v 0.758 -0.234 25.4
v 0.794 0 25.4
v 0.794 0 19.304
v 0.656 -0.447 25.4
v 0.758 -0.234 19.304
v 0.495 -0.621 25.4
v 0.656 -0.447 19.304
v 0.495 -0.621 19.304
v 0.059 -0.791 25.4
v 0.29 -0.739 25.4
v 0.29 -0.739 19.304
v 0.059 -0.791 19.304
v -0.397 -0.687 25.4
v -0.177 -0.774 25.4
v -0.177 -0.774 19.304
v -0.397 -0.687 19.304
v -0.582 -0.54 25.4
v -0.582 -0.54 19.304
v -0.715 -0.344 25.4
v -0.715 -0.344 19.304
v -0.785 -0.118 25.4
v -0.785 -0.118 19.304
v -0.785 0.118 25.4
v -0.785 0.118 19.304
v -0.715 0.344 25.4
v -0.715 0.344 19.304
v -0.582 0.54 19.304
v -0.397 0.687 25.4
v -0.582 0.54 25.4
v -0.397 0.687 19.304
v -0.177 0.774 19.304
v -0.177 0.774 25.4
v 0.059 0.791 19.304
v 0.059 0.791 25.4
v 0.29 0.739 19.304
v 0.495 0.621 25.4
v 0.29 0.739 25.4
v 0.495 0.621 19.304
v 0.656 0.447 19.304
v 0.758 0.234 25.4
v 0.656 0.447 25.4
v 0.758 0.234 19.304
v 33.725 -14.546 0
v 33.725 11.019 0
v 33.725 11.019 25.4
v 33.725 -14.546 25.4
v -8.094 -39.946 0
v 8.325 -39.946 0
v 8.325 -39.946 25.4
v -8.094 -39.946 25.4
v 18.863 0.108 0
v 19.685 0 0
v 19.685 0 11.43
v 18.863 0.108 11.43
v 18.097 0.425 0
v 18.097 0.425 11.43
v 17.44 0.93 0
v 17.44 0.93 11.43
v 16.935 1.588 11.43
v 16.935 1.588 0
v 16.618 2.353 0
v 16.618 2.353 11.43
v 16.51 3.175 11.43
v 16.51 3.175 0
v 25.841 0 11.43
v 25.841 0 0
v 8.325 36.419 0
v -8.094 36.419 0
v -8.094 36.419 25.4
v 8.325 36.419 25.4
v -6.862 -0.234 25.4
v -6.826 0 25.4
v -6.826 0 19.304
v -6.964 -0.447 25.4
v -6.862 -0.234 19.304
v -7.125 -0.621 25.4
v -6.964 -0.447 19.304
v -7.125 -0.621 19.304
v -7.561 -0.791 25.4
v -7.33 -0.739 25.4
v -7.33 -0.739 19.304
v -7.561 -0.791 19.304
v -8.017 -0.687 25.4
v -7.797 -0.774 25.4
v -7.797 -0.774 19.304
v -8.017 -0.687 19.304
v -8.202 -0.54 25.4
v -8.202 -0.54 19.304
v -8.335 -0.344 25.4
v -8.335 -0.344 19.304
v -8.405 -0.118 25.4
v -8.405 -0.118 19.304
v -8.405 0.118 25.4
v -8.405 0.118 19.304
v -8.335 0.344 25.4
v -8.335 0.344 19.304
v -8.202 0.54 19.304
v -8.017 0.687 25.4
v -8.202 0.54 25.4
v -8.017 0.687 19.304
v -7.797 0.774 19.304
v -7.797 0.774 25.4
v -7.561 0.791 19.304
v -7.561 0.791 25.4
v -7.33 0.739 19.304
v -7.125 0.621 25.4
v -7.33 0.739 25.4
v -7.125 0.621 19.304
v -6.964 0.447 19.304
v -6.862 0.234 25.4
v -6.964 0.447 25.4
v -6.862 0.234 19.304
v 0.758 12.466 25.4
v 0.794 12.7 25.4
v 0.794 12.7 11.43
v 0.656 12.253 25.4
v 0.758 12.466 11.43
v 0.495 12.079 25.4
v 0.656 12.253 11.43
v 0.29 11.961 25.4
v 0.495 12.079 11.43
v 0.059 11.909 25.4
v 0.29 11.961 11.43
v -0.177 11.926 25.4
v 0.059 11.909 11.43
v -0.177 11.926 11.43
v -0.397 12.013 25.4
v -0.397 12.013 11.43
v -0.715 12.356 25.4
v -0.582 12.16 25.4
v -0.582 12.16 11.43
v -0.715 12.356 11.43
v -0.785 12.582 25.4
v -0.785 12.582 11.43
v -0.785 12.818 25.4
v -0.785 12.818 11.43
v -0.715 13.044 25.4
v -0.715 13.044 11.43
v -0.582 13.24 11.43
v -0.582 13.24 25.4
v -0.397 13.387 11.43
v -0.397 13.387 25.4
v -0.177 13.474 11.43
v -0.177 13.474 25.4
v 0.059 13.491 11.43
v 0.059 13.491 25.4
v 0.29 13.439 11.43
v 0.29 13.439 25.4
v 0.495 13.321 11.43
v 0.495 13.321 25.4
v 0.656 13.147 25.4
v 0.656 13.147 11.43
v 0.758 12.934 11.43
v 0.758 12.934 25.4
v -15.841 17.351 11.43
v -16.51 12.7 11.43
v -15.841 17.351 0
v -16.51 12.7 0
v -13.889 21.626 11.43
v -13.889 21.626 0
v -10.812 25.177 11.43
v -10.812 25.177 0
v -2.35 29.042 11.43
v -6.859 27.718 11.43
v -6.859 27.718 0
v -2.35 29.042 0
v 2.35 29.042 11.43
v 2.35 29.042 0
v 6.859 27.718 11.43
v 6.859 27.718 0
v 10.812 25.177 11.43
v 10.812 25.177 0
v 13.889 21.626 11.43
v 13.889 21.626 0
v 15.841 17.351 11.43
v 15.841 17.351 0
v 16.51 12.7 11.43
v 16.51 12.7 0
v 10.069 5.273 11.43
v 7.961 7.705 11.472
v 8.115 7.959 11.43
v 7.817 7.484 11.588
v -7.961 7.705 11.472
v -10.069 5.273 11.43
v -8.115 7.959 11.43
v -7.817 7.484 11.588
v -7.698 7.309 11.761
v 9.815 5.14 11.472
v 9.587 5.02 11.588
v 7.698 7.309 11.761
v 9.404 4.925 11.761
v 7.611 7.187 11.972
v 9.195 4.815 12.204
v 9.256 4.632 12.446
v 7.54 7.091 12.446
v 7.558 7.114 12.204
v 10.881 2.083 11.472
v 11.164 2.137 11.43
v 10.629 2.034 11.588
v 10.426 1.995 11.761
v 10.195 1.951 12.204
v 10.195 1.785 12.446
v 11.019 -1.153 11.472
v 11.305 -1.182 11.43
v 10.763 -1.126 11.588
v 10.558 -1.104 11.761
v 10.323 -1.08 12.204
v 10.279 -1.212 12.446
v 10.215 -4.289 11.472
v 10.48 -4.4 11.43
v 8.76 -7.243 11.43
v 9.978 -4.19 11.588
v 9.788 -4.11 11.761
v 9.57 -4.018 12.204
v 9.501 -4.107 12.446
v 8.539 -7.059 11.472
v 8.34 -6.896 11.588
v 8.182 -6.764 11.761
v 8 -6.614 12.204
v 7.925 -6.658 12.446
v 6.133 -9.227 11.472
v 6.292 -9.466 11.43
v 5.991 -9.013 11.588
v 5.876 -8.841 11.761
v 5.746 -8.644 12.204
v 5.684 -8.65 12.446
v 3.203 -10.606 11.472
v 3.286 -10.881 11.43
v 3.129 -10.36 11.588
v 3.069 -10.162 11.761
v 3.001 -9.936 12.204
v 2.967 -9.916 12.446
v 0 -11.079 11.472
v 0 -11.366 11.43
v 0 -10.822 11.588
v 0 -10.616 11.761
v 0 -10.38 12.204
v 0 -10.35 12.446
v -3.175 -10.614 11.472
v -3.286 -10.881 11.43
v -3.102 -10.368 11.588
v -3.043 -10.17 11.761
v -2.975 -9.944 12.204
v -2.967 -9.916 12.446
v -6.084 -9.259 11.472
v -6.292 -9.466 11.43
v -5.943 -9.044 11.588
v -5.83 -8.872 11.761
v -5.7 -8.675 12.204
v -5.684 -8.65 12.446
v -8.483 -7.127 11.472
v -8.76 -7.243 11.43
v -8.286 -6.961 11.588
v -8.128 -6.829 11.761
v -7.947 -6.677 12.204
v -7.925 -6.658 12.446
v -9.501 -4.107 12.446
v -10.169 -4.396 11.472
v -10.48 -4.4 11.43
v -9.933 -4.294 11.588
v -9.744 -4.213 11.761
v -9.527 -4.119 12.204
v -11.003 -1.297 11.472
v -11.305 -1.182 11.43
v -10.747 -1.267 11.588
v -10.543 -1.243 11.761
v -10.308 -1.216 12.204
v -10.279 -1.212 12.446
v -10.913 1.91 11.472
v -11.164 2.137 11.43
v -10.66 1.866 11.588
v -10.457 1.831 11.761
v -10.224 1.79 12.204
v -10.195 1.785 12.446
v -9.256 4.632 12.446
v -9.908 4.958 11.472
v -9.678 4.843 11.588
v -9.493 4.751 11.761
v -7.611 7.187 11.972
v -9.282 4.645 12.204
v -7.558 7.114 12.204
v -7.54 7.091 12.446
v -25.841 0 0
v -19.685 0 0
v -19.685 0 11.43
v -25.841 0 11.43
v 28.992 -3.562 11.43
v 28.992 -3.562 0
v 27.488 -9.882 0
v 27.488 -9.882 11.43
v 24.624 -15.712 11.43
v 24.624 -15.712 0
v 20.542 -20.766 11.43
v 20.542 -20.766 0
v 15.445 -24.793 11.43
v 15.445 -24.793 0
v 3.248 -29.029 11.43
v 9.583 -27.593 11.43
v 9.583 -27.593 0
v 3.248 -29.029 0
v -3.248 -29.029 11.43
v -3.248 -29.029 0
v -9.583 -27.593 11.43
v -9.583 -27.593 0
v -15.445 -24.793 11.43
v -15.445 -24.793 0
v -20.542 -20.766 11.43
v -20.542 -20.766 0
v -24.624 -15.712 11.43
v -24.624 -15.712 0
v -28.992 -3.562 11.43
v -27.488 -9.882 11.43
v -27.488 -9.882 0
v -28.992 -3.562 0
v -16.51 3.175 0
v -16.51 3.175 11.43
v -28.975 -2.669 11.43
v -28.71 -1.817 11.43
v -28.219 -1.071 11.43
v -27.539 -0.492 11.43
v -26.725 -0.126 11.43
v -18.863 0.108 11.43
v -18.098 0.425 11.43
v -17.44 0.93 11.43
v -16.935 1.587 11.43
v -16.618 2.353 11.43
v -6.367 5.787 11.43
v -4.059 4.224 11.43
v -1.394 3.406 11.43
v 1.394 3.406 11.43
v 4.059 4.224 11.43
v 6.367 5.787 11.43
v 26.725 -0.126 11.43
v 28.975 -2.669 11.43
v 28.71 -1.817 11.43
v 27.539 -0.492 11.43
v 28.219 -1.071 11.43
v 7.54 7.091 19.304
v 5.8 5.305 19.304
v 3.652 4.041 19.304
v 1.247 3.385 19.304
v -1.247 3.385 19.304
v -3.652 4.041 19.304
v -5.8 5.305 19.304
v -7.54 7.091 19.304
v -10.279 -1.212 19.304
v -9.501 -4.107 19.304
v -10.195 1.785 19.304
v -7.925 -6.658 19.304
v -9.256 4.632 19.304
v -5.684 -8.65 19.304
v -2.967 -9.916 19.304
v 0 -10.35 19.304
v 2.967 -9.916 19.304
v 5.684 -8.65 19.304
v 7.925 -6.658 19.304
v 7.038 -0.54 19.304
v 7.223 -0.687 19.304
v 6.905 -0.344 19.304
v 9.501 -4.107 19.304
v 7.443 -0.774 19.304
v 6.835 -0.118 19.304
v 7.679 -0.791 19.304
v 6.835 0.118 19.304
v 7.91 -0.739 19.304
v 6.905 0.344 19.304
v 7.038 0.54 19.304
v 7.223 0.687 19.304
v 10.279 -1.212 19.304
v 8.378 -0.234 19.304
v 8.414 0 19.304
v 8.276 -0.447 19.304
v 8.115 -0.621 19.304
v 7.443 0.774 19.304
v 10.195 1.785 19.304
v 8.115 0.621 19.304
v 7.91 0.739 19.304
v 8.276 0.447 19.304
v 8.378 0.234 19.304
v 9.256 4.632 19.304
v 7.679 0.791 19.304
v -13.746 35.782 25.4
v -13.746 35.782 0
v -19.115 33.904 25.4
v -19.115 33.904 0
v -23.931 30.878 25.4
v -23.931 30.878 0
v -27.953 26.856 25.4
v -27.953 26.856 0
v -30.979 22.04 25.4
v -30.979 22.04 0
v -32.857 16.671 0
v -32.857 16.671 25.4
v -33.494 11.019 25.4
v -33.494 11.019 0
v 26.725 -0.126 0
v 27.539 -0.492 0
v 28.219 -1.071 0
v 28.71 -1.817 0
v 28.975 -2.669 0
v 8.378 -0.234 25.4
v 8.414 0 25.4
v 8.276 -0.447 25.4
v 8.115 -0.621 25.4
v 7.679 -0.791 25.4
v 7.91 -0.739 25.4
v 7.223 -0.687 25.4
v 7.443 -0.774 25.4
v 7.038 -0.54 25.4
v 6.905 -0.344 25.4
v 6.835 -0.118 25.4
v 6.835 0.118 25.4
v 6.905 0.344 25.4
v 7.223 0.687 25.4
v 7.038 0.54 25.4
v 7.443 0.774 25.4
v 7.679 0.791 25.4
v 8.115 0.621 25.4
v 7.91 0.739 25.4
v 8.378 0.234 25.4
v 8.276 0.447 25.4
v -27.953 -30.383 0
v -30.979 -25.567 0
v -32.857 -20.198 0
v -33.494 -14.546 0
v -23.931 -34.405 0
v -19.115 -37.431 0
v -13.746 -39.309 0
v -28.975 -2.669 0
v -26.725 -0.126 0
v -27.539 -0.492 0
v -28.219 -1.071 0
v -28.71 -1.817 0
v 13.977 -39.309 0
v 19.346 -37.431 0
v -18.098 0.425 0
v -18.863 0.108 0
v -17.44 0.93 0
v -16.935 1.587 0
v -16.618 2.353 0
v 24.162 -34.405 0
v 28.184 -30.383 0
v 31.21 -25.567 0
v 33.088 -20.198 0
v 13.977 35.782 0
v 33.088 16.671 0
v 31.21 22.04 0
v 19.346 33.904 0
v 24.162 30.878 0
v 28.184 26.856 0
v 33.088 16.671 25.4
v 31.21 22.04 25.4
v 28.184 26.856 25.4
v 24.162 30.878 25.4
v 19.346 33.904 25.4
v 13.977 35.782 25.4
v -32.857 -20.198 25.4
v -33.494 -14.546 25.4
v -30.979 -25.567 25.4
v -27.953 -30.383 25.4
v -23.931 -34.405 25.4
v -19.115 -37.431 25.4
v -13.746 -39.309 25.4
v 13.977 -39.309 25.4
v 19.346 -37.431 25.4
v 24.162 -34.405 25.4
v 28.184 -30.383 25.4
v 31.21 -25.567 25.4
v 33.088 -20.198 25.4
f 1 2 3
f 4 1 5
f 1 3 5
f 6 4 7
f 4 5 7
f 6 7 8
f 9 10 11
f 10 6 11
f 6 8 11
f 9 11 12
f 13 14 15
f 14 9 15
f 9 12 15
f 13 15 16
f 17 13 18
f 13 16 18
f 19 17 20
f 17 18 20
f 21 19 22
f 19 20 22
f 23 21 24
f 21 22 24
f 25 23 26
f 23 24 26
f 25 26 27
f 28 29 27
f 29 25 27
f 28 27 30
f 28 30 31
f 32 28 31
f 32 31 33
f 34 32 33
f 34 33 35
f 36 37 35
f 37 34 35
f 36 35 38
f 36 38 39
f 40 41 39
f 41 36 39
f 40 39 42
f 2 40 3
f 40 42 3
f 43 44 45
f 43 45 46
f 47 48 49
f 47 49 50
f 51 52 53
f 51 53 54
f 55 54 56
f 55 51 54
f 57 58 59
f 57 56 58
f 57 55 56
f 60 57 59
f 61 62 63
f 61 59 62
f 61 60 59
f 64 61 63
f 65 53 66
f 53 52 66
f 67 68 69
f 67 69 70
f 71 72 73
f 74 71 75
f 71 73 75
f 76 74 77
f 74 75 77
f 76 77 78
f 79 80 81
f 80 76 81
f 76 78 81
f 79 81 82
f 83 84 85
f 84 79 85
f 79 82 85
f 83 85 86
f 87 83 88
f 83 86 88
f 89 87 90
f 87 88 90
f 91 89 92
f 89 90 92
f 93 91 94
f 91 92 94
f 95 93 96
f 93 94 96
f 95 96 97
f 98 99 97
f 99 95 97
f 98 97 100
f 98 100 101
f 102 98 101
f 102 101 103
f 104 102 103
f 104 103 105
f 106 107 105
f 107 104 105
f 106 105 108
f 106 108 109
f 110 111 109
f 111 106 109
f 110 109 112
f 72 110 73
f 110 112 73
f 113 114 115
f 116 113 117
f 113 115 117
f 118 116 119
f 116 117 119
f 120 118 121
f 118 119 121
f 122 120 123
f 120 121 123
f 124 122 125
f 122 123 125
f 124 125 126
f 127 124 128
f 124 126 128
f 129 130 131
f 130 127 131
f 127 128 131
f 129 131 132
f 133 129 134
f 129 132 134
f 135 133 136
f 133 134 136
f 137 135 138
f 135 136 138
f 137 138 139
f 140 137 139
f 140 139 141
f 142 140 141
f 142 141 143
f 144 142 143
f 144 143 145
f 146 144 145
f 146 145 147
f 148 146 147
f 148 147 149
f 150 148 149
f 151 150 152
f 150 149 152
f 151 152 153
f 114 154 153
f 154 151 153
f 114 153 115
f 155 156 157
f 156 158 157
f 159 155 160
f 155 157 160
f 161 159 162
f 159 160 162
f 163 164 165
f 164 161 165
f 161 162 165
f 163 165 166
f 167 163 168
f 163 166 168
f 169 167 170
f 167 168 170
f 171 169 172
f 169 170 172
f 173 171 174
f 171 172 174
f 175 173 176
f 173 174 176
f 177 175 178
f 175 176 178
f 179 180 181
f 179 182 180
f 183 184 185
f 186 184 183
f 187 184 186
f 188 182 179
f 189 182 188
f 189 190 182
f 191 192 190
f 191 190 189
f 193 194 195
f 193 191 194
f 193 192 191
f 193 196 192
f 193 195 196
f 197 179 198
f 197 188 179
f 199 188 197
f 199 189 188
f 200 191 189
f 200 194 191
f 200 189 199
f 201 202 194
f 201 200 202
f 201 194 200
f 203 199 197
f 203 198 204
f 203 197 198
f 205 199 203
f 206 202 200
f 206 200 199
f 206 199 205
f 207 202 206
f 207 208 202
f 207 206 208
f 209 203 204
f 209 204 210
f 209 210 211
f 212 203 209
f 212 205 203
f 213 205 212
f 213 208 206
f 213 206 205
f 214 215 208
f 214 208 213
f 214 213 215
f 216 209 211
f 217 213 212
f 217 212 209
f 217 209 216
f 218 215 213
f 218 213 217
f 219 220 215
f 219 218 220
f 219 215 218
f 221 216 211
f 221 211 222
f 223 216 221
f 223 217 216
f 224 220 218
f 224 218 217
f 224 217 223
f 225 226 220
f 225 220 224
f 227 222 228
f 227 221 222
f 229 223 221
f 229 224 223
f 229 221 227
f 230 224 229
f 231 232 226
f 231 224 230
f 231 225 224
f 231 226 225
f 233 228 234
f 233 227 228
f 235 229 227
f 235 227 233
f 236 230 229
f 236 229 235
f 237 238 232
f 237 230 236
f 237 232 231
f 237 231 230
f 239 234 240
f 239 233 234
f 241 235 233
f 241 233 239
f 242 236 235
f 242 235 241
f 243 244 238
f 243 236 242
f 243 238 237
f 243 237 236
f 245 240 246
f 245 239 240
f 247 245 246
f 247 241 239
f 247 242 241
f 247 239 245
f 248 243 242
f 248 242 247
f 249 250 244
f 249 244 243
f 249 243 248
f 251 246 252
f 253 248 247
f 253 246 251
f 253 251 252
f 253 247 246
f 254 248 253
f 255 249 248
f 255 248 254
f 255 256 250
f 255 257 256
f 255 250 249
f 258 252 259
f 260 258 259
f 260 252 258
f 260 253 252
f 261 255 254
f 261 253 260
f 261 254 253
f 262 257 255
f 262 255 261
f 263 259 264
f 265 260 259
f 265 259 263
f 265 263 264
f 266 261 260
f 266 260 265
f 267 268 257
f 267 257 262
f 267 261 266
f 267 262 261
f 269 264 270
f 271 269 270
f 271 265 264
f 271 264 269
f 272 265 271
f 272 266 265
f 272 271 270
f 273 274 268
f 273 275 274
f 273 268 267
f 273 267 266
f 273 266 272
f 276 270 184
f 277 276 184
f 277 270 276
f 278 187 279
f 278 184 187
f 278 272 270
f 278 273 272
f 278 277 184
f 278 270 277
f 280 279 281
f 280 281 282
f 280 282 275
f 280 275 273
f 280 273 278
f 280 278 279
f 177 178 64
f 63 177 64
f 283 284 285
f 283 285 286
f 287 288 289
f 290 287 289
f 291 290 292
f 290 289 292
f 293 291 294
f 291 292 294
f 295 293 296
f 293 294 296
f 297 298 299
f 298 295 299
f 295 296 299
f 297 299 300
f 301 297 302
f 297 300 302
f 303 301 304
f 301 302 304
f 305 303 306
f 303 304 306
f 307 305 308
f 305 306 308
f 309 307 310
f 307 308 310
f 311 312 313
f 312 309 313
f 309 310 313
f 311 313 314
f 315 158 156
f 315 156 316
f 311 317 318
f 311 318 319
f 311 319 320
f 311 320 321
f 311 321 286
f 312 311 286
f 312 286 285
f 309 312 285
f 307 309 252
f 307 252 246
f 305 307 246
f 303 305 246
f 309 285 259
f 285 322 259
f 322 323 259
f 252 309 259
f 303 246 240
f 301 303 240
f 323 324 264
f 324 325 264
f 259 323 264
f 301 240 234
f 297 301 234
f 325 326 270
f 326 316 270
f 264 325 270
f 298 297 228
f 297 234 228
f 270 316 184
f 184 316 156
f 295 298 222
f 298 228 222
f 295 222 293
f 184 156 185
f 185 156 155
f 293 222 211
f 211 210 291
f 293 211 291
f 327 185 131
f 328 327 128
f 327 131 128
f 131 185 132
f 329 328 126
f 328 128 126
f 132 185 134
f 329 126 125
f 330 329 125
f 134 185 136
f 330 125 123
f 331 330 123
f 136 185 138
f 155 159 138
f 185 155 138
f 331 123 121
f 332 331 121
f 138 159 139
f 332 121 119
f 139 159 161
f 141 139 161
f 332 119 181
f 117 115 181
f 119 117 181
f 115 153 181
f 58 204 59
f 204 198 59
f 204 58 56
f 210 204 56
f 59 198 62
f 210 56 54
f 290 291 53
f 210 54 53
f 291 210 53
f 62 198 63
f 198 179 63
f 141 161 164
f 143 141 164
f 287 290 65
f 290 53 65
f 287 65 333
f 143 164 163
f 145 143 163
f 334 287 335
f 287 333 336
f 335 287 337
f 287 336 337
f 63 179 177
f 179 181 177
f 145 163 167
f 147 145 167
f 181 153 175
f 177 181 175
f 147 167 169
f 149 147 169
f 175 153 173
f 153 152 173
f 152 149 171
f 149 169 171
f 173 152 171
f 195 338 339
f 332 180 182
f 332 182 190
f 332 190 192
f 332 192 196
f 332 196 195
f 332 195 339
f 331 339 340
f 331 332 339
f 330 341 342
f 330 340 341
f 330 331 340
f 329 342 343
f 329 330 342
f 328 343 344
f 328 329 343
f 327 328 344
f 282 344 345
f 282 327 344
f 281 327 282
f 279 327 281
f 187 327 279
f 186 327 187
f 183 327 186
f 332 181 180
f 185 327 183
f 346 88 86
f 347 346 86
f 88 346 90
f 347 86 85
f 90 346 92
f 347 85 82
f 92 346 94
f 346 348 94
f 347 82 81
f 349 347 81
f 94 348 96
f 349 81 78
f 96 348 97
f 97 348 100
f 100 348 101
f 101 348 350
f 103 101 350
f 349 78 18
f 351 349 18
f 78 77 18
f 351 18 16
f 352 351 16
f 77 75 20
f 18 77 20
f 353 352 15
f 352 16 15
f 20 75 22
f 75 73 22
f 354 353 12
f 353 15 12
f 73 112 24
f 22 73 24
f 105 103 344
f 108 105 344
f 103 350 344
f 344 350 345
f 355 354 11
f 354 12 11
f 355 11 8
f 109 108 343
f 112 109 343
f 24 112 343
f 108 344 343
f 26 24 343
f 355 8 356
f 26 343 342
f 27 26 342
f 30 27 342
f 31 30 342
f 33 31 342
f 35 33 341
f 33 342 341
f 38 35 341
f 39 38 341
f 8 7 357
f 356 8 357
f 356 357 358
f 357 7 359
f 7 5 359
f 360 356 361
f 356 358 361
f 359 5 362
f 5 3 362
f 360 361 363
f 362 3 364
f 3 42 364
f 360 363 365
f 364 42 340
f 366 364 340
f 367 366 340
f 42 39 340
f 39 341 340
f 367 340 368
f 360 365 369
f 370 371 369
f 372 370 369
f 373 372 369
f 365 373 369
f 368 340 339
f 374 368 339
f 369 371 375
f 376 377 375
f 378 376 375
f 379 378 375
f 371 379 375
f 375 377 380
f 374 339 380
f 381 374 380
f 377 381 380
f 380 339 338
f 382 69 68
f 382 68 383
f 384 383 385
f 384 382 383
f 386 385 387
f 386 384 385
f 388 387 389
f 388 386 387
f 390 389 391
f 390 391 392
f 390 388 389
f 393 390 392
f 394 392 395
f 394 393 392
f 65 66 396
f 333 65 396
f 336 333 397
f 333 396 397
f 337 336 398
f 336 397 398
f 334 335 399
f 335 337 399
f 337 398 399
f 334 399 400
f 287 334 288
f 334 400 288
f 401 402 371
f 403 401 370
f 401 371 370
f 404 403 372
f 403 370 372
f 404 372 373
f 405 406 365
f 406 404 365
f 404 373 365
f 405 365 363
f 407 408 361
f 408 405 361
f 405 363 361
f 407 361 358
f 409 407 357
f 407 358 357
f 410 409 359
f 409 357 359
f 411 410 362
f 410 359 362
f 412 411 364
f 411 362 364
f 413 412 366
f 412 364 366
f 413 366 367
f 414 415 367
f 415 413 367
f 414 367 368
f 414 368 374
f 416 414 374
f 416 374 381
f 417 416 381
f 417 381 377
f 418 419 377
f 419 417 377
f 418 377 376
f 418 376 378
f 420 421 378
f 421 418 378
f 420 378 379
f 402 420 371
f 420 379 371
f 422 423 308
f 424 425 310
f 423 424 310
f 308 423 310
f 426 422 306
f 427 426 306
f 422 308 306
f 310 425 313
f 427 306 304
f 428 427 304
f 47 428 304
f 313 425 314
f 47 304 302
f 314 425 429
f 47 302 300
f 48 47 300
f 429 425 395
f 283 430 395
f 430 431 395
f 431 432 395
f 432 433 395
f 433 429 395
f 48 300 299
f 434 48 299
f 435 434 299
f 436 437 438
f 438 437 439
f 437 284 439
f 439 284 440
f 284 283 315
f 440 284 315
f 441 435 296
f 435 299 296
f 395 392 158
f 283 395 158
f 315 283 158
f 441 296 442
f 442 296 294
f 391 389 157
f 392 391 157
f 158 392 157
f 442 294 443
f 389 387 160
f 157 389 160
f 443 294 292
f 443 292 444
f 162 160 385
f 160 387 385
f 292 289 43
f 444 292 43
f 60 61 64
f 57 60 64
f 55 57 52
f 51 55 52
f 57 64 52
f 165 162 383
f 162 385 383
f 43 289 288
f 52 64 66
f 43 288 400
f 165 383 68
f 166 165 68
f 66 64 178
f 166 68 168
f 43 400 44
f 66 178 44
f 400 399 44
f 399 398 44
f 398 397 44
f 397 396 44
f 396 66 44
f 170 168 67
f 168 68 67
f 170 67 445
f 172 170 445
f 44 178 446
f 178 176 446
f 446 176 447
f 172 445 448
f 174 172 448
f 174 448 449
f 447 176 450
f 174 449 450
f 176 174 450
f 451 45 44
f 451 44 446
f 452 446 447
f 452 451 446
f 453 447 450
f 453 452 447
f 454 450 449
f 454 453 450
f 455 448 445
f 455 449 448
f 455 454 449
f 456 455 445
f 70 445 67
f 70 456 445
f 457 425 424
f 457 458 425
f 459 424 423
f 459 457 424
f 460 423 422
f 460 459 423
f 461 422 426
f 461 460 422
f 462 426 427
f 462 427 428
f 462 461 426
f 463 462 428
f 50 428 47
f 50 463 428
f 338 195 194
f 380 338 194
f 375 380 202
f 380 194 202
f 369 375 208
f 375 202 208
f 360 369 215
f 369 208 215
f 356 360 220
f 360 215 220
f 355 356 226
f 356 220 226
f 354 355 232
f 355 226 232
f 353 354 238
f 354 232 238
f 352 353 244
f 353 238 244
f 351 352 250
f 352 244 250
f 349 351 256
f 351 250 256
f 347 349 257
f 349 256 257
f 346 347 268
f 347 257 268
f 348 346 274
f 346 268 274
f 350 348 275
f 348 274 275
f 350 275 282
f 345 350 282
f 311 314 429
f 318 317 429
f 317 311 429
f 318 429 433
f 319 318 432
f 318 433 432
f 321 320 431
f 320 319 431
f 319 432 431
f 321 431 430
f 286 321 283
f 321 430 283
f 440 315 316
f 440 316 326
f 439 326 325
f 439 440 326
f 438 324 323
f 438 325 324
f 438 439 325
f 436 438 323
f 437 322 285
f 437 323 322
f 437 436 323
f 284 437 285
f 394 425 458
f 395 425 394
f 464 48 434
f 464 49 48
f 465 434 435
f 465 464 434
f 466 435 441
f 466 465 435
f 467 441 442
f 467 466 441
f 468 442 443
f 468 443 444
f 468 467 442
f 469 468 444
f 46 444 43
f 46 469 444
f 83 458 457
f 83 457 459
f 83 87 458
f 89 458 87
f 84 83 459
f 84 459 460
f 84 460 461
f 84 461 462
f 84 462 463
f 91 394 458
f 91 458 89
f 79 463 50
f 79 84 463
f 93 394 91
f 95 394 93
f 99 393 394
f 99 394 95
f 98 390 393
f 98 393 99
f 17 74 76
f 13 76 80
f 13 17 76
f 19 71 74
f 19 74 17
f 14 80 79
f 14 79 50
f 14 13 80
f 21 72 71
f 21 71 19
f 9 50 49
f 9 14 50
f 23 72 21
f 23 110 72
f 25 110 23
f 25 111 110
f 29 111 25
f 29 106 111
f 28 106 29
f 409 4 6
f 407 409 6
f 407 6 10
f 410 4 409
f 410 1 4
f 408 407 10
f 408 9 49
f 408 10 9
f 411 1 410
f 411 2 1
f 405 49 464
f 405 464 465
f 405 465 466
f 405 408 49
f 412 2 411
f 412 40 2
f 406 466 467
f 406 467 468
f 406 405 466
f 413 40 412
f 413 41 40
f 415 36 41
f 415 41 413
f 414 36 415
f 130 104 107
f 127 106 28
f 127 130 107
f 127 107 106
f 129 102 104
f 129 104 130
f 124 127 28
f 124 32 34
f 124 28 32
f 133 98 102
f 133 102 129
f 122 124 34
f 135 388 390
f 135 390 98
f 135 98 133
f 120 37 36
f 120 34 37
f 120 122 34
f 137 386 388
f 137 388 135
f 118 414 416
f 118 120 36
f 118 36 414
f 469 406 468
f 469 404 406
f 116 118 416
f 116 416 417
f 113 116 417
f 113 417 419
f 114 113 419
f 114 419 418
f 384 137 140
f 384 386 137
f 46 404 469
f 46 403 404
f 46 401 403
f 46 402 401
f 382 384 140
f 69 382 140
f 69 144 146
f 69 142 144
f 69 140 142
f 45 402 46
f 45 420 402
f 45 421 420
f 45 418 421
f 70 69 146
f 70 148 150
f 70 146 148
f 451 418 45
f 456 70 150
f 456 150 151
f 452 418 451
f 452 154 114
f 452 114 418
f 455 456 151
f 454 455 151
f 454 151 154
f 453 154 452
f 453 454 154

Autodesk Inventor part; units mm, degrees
ref_plane "YZ Plane" through (0, 0, 0) normal (1, 0, 0) x (0, 1, 0)
ref_plane "XZ Plane" through (0, 0, 0) normal (0, 1, 0) x (-1, 0, 0)
ref_plane "XY Plane" through (0, 0, 0) normal (0, 0, 1) x (1, 0, 0)
sketch "Sketch1" plane through (0, 0, 0) normal (0, 0, 1) x (1, 0, 0)
  circle A0 centre (0, 12.7) radius 4.0132
  circle A1 centre (-7.62, 0) radius 1.7145
  circle A2 centre (7.62, 0) radius 1.7145
  circle A3 centre (0, 0) radius 9.525
  arc A4 (-28.992, -3.5622) -> (28.992, -3.5622) centre (0, 0) ccw
  line L0 (-16.51, 12.7) -> (-16.51, 3.175)
  line L1 (16.51, 12.7) -> (16.51, 3.175)
  line L2 (19.685, 0) -> (25.8407, 0)
  line L3 (-19.685, 0) -> (-25.8407, 0)
  arc A5 (16.51, 12.7) -> (-16.51, 12.7) centre (0, 12.7) ccw
  arc A6 (-25.8407, 0) -> (-28.992, -3.5622) centre (-25.8407, -3.175) ccw
  arc A7 (-19.685, 0) -> (-16.51, 3.175) centre (-19.685, 3.175) ccw
  arc A8 (16.51, 3.175) -> (19.685, 0) centre (19.685, 3.175) ccw
  arc A9 (28.992, -3.5622) -> (25.8407, 0) centre (25.8407, -3.175) ccw
  circle A10 centre (0, 12.7) radius 9.398
  circle A11 centre (0, 0) radius 2.4765
  circle A12 centre (0, 0) radius 6.35
  line L4 (-33.494, 36.419) -> (33.7251, 36.419)
  line L5 (33.7251, 36.419) -> (33.7251, -39.9461)
  line L6 (33.7251, -39.9461) -> (-33.494, -39.9461)
  line L7 (-33.494, -39.9461) -> (-33.494, 36.419)
  circle A13 centre (0, 0) radius 10.3505
  circle A14 centre (-7.62, 0) radius 0.7937
  circle A15 centre (0, 0) radius 0.7937
  circle A16 centre (7.62, 0) radius 0.7937
  circle A17 centre (0, 12.7) radius 0.7937
  line L8 (-16.8374, 12.7) -> (-16.8374, 3.175)
  arc A18 (-19.685, 0.3274) -> (-16.8374, 3.175) centre (-19.685, 3.175) ccw
  line L9 (-19.685, 0.3274) -> (-25.8407, 0.3274)
  arc A19 (-25.8407, 0.3274) -> (-29.3169, -3.6021) centre (-25.8407, -3.175) ccw
  arc A20 (-29.3169, -3.6021) -> (29.3169, -3.6021) centre (0, 0) ccw
  arc A21 (29.3169, -3.6021) -> (25.8407, 0.3274) centre (25.8407, -3.175) ccw
  line L10 (25.8407, 0.3274) -> (19.685, 0.3274)
  arc A22 (16.8374, 3.175) -> (19.685, 0.3274) centre (19.685, 3.175) ccw
  line L11 (16.8374, 3.175) -> (16.8374, 12.7)
  arc A23 (16.8374, 12.7) -> (-16.8374, 12.7) centre (0, 12.7) ccw
  point P0 (-16.51, -24.0966)
  point P1 (16.51, -24.0966)
  point P2 (-29.21, 0)
  point P3 (29.21, 0)
  point P4 (-2.1125, 9.2878)
  point P5 (2.1125, 9.2878)
  point P6 (7.0137, 6.4446)
  point P7 (-7.0137, 6.4446)
  point P8 (-6.263, 1.0478)
  point P9 (-6.263, -1.0478)
  point P10 (6.263, -1.0478)
  point P11 (6.263, 1.0478)
  point P12 (4.5198, 4.4602)
  point P13 (-4.5198, 4.4602)
  point P14 (-7.5403, 7.0906)
  point P15 (7.5403, 7.0906)
  dimension "d20" = 8.0264
  dimension "d44" = 3.175
  dimension "d57" = 18.796
  dimension "d70" = 3.429
  dimension "d73" = 29.21
  dimension "d76" = 7.62
  dimension "d77" = 7.62
  dimension "d84" = 12.7
  dimension "d85" = 4.953
  dimension "d97" = 1.5875
  dimension "d98" = 1.5875
  dimension "d99" = 1.5875
  dimension "d100" = 1.5875
  dimension "d109" = 20.701
extrude "Extrusion22" add sketch "Sketch1" along normal blind 25.4 contours A0 A13 | A0 A13 A10 | A13 A0 A3 | A0 A3 A10 A13 | A13 A10 A3 A0 | A3 A0 | A0 A3 A10 A12 | A10 A3 A13 | A10 A12 A1 A2 A3 | A12 A10 | A10 A12 A2 A1 | A12 A1 | A1 A12 | A12 A2 | A2 A12 | A6 L3 A7 L0 A5 L1 A8 L2 A9 A4 | A11 | L4 L5 L6 L7 | A23 L11 A22 L10 A21 A20 A19 L9 A18 L8
extrude "Extrusion23" cut sketch "Sketch1" along normal blind 19.304 contours A10 A3 A13 | A10 A12 A1 A2 A3 | A10 A12 A2 A1 | A12 A1 | A1 A12 | A12 A2 | A2 A12 | A11 | A14 | A15 | A16
extrude "Extrusion24" cut sketch "Sketch1" along normal blind 11.43 contours A0 A13 | A0 A13 A10 | A13 A0 A3 | A0 A3 A10 A13 | A13 A10 A3 A0 | A3 A0 | A0 A3 A10 A12 | A10 A3 A13 | A10 A12 A1 A2 A3 | A12 A10 | A10 A12 A2 A1 | A12 A1 | A1 A12 | A12 A2 | A2 A12 | A6 L3 A7 L0 A5 L1 A8 L2 A9 A4 | A11 | A14 | A15 | A16 | A17
fillet "Fillet4" radius 1.016 1 edges at (0, -10.3505, 11.43)
fillet "Fillet5" radius 25.4 4 edges at (33.7251, -39.9461, 12.7) (-33.494, -39.9461, 12.7) (-33.494, 36.419, 12.7) (33.7251, 36.419, 12.7)
properties part number "Crank on Crankshaft_3DPrint"
